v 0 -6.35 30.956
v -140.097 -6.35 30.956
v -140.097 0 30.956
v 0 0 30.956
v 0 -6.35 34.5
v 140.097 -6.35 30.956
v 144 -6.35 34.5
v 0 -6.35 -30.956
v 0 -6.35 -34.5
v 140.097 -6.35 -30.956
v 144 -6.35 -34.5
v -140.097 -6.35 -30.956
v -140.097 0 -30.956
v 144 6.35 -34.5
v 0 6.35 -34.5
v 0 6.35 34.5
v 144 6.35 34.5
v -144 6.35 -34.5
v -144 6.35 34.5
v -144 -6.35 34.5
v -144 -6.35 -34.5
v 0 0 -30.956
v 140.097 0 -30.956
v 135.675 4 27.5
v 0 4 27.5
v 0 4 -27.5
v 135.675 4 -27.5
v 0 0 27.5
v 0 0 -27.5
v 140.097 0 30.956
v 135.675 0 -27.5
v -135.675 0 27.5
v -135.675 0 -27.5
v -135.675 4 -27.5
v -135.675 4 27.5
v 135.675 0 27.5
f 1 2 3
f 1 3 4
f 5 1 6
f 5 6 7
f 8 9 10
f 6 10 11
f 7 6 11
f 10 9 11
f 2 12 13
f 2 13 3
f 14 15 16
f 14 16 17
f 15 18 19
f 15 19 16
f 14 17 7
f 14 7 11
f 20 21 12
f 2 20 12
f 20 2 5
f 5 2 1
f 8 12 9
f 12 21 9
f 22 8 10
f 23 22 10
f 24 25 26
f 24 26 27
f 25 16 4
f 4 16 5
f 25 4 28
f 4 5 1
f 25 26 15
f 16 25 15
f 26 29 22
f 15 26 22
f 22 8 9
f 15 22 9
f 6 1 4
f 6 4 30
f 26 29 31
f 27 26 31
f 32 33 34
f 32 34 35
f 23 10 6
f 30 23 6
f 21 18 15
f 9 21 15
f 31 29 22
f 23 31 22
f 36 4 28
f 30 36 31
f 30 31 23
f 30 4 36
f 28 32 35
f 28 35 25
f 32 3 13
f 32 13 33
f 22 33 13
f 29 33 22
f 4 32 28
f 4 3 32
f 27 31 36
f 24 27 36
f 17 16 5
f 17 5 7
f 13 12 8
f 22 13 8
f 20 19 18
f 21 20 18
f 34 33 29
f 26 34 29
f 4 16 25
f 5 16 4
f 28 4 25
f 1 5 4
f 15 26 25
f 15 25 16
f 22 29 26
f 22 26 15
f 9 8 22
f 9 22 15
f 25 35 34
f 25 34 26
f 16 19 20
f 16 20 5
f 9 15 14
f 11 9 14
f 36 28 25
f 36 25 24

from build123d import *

# Parameters (mm, degrees)
SKETCH2_W              = 288
SKETCH2_H              = 69
BOSS_EXTRUDE1_DEPTH    = 6.35
SKETCH3_W              = 280.19375
SKETCH3_H              = 61.9125
CUT_EXTRUDE1_DEPTH     = 6.35
SKETCH4_W              = 271.35
SKETCH4_H              = 55
CUT_EXTRUDE2_DEPTH     = 4
SPLIT1_SURFACE_1_BACK  = 297.422
SPLIT1_SURFACE_1_DEPTH = 594.844
SPLIT1_SURFACE_2_BACK  = 297.422
SPLIT1_SURFACE_2_DEPTH = 594.844


with BuildPart() as part:
    # Sketch2 → Boss-Extrude1 (new, symmetric)
    with BuildSketch(Plane(origin=(0, 0, 0), x_dir=(1, 0, 0), z_dir=(0, 1, 0))):
        Rectangle(SKETCH2_W, SKETCH2_H)
    extrude(amount=BOSS_EXTRUDE1_DEPTH, both=True)

    # Sketch3 → Cut-Extrude1 (cut)
    with BuildSketch(Plane.XZ.offset(6.35)):
        Rectangle(SKETCH3_W, SKETCH3_H)
    extrude(amount=-CUT_EXTRUDE1_DEPTH, mode=Mode.SUBTRACT)

    # Sketch4 → Cut-Extrude2 (cut)
    with BuildSketch(Plane.XZ):
        Rectangle(SKETCH4_W, SKETCH4_H)
    extrude(amount=-CUT_EXTRUDE2_DEPTH, mode=Mode.SUBTRACT)


with BuildPart() as body_2:
    # Split1: the piece behind the surface
    add(part.part)
    # Split1 surface: a surface, the sketch's curves swept straight by 594.844 mm
    with BuildLine(Plane(origin=(0, 6.35, 0), x_dir=(1, 0, 0), z_dir=(0, 1, 0)).offset(-SPLIT1_SURFACE_1_BACK), mode=Mode.PRIVATE) as split1_surface_1_path:
        Line((0, -34.5), (0, 34.5))
    split1_surface_1 = Shell.extrude(split1_surface_1_path.wire(), (0 * SPLIT1_SURFACE_1_DEPTH, 1 * SPLIT1_SURFACE_1_DEPTH, 0 * SPLIT1_SURFACE_1_DEPTH))
    split(bisect_by=split1_surface_1, keep=Keep.BOTTOM)


with BuildPart() as part_1:
    add(part.part)

    # Split1: split by a surface, the side it looks to stays
    # Split1 surface: a surface, the sketch's curves swept straight by 594.844 mm
    with BuildLine(Plane(origin=(0, 6.35, 0), x_dir=(1, 0, 0), z_dir=(0, 1, 0)).offset(-SPLIT1_SURFACE_2_BACK), mode=Mode.PRIVATE) as split1_surface_2_path:
        Line((0, -34.5), (0, 34.5))
    split1_surface_2 = Shell.extrude(split1_surface_2_path.wire(), (0 * SPLIT1_SURFACE_2_DEPTH, 1 * SPLIT1_SURFACE_2_DEPTH, 0 * SPLIT1_SURFACE_2_DEPTH))
    split(bisect_by=split1_surface_2, keep=Keep.TOP)


solid = Compound([body_2.part, part_1.part])
